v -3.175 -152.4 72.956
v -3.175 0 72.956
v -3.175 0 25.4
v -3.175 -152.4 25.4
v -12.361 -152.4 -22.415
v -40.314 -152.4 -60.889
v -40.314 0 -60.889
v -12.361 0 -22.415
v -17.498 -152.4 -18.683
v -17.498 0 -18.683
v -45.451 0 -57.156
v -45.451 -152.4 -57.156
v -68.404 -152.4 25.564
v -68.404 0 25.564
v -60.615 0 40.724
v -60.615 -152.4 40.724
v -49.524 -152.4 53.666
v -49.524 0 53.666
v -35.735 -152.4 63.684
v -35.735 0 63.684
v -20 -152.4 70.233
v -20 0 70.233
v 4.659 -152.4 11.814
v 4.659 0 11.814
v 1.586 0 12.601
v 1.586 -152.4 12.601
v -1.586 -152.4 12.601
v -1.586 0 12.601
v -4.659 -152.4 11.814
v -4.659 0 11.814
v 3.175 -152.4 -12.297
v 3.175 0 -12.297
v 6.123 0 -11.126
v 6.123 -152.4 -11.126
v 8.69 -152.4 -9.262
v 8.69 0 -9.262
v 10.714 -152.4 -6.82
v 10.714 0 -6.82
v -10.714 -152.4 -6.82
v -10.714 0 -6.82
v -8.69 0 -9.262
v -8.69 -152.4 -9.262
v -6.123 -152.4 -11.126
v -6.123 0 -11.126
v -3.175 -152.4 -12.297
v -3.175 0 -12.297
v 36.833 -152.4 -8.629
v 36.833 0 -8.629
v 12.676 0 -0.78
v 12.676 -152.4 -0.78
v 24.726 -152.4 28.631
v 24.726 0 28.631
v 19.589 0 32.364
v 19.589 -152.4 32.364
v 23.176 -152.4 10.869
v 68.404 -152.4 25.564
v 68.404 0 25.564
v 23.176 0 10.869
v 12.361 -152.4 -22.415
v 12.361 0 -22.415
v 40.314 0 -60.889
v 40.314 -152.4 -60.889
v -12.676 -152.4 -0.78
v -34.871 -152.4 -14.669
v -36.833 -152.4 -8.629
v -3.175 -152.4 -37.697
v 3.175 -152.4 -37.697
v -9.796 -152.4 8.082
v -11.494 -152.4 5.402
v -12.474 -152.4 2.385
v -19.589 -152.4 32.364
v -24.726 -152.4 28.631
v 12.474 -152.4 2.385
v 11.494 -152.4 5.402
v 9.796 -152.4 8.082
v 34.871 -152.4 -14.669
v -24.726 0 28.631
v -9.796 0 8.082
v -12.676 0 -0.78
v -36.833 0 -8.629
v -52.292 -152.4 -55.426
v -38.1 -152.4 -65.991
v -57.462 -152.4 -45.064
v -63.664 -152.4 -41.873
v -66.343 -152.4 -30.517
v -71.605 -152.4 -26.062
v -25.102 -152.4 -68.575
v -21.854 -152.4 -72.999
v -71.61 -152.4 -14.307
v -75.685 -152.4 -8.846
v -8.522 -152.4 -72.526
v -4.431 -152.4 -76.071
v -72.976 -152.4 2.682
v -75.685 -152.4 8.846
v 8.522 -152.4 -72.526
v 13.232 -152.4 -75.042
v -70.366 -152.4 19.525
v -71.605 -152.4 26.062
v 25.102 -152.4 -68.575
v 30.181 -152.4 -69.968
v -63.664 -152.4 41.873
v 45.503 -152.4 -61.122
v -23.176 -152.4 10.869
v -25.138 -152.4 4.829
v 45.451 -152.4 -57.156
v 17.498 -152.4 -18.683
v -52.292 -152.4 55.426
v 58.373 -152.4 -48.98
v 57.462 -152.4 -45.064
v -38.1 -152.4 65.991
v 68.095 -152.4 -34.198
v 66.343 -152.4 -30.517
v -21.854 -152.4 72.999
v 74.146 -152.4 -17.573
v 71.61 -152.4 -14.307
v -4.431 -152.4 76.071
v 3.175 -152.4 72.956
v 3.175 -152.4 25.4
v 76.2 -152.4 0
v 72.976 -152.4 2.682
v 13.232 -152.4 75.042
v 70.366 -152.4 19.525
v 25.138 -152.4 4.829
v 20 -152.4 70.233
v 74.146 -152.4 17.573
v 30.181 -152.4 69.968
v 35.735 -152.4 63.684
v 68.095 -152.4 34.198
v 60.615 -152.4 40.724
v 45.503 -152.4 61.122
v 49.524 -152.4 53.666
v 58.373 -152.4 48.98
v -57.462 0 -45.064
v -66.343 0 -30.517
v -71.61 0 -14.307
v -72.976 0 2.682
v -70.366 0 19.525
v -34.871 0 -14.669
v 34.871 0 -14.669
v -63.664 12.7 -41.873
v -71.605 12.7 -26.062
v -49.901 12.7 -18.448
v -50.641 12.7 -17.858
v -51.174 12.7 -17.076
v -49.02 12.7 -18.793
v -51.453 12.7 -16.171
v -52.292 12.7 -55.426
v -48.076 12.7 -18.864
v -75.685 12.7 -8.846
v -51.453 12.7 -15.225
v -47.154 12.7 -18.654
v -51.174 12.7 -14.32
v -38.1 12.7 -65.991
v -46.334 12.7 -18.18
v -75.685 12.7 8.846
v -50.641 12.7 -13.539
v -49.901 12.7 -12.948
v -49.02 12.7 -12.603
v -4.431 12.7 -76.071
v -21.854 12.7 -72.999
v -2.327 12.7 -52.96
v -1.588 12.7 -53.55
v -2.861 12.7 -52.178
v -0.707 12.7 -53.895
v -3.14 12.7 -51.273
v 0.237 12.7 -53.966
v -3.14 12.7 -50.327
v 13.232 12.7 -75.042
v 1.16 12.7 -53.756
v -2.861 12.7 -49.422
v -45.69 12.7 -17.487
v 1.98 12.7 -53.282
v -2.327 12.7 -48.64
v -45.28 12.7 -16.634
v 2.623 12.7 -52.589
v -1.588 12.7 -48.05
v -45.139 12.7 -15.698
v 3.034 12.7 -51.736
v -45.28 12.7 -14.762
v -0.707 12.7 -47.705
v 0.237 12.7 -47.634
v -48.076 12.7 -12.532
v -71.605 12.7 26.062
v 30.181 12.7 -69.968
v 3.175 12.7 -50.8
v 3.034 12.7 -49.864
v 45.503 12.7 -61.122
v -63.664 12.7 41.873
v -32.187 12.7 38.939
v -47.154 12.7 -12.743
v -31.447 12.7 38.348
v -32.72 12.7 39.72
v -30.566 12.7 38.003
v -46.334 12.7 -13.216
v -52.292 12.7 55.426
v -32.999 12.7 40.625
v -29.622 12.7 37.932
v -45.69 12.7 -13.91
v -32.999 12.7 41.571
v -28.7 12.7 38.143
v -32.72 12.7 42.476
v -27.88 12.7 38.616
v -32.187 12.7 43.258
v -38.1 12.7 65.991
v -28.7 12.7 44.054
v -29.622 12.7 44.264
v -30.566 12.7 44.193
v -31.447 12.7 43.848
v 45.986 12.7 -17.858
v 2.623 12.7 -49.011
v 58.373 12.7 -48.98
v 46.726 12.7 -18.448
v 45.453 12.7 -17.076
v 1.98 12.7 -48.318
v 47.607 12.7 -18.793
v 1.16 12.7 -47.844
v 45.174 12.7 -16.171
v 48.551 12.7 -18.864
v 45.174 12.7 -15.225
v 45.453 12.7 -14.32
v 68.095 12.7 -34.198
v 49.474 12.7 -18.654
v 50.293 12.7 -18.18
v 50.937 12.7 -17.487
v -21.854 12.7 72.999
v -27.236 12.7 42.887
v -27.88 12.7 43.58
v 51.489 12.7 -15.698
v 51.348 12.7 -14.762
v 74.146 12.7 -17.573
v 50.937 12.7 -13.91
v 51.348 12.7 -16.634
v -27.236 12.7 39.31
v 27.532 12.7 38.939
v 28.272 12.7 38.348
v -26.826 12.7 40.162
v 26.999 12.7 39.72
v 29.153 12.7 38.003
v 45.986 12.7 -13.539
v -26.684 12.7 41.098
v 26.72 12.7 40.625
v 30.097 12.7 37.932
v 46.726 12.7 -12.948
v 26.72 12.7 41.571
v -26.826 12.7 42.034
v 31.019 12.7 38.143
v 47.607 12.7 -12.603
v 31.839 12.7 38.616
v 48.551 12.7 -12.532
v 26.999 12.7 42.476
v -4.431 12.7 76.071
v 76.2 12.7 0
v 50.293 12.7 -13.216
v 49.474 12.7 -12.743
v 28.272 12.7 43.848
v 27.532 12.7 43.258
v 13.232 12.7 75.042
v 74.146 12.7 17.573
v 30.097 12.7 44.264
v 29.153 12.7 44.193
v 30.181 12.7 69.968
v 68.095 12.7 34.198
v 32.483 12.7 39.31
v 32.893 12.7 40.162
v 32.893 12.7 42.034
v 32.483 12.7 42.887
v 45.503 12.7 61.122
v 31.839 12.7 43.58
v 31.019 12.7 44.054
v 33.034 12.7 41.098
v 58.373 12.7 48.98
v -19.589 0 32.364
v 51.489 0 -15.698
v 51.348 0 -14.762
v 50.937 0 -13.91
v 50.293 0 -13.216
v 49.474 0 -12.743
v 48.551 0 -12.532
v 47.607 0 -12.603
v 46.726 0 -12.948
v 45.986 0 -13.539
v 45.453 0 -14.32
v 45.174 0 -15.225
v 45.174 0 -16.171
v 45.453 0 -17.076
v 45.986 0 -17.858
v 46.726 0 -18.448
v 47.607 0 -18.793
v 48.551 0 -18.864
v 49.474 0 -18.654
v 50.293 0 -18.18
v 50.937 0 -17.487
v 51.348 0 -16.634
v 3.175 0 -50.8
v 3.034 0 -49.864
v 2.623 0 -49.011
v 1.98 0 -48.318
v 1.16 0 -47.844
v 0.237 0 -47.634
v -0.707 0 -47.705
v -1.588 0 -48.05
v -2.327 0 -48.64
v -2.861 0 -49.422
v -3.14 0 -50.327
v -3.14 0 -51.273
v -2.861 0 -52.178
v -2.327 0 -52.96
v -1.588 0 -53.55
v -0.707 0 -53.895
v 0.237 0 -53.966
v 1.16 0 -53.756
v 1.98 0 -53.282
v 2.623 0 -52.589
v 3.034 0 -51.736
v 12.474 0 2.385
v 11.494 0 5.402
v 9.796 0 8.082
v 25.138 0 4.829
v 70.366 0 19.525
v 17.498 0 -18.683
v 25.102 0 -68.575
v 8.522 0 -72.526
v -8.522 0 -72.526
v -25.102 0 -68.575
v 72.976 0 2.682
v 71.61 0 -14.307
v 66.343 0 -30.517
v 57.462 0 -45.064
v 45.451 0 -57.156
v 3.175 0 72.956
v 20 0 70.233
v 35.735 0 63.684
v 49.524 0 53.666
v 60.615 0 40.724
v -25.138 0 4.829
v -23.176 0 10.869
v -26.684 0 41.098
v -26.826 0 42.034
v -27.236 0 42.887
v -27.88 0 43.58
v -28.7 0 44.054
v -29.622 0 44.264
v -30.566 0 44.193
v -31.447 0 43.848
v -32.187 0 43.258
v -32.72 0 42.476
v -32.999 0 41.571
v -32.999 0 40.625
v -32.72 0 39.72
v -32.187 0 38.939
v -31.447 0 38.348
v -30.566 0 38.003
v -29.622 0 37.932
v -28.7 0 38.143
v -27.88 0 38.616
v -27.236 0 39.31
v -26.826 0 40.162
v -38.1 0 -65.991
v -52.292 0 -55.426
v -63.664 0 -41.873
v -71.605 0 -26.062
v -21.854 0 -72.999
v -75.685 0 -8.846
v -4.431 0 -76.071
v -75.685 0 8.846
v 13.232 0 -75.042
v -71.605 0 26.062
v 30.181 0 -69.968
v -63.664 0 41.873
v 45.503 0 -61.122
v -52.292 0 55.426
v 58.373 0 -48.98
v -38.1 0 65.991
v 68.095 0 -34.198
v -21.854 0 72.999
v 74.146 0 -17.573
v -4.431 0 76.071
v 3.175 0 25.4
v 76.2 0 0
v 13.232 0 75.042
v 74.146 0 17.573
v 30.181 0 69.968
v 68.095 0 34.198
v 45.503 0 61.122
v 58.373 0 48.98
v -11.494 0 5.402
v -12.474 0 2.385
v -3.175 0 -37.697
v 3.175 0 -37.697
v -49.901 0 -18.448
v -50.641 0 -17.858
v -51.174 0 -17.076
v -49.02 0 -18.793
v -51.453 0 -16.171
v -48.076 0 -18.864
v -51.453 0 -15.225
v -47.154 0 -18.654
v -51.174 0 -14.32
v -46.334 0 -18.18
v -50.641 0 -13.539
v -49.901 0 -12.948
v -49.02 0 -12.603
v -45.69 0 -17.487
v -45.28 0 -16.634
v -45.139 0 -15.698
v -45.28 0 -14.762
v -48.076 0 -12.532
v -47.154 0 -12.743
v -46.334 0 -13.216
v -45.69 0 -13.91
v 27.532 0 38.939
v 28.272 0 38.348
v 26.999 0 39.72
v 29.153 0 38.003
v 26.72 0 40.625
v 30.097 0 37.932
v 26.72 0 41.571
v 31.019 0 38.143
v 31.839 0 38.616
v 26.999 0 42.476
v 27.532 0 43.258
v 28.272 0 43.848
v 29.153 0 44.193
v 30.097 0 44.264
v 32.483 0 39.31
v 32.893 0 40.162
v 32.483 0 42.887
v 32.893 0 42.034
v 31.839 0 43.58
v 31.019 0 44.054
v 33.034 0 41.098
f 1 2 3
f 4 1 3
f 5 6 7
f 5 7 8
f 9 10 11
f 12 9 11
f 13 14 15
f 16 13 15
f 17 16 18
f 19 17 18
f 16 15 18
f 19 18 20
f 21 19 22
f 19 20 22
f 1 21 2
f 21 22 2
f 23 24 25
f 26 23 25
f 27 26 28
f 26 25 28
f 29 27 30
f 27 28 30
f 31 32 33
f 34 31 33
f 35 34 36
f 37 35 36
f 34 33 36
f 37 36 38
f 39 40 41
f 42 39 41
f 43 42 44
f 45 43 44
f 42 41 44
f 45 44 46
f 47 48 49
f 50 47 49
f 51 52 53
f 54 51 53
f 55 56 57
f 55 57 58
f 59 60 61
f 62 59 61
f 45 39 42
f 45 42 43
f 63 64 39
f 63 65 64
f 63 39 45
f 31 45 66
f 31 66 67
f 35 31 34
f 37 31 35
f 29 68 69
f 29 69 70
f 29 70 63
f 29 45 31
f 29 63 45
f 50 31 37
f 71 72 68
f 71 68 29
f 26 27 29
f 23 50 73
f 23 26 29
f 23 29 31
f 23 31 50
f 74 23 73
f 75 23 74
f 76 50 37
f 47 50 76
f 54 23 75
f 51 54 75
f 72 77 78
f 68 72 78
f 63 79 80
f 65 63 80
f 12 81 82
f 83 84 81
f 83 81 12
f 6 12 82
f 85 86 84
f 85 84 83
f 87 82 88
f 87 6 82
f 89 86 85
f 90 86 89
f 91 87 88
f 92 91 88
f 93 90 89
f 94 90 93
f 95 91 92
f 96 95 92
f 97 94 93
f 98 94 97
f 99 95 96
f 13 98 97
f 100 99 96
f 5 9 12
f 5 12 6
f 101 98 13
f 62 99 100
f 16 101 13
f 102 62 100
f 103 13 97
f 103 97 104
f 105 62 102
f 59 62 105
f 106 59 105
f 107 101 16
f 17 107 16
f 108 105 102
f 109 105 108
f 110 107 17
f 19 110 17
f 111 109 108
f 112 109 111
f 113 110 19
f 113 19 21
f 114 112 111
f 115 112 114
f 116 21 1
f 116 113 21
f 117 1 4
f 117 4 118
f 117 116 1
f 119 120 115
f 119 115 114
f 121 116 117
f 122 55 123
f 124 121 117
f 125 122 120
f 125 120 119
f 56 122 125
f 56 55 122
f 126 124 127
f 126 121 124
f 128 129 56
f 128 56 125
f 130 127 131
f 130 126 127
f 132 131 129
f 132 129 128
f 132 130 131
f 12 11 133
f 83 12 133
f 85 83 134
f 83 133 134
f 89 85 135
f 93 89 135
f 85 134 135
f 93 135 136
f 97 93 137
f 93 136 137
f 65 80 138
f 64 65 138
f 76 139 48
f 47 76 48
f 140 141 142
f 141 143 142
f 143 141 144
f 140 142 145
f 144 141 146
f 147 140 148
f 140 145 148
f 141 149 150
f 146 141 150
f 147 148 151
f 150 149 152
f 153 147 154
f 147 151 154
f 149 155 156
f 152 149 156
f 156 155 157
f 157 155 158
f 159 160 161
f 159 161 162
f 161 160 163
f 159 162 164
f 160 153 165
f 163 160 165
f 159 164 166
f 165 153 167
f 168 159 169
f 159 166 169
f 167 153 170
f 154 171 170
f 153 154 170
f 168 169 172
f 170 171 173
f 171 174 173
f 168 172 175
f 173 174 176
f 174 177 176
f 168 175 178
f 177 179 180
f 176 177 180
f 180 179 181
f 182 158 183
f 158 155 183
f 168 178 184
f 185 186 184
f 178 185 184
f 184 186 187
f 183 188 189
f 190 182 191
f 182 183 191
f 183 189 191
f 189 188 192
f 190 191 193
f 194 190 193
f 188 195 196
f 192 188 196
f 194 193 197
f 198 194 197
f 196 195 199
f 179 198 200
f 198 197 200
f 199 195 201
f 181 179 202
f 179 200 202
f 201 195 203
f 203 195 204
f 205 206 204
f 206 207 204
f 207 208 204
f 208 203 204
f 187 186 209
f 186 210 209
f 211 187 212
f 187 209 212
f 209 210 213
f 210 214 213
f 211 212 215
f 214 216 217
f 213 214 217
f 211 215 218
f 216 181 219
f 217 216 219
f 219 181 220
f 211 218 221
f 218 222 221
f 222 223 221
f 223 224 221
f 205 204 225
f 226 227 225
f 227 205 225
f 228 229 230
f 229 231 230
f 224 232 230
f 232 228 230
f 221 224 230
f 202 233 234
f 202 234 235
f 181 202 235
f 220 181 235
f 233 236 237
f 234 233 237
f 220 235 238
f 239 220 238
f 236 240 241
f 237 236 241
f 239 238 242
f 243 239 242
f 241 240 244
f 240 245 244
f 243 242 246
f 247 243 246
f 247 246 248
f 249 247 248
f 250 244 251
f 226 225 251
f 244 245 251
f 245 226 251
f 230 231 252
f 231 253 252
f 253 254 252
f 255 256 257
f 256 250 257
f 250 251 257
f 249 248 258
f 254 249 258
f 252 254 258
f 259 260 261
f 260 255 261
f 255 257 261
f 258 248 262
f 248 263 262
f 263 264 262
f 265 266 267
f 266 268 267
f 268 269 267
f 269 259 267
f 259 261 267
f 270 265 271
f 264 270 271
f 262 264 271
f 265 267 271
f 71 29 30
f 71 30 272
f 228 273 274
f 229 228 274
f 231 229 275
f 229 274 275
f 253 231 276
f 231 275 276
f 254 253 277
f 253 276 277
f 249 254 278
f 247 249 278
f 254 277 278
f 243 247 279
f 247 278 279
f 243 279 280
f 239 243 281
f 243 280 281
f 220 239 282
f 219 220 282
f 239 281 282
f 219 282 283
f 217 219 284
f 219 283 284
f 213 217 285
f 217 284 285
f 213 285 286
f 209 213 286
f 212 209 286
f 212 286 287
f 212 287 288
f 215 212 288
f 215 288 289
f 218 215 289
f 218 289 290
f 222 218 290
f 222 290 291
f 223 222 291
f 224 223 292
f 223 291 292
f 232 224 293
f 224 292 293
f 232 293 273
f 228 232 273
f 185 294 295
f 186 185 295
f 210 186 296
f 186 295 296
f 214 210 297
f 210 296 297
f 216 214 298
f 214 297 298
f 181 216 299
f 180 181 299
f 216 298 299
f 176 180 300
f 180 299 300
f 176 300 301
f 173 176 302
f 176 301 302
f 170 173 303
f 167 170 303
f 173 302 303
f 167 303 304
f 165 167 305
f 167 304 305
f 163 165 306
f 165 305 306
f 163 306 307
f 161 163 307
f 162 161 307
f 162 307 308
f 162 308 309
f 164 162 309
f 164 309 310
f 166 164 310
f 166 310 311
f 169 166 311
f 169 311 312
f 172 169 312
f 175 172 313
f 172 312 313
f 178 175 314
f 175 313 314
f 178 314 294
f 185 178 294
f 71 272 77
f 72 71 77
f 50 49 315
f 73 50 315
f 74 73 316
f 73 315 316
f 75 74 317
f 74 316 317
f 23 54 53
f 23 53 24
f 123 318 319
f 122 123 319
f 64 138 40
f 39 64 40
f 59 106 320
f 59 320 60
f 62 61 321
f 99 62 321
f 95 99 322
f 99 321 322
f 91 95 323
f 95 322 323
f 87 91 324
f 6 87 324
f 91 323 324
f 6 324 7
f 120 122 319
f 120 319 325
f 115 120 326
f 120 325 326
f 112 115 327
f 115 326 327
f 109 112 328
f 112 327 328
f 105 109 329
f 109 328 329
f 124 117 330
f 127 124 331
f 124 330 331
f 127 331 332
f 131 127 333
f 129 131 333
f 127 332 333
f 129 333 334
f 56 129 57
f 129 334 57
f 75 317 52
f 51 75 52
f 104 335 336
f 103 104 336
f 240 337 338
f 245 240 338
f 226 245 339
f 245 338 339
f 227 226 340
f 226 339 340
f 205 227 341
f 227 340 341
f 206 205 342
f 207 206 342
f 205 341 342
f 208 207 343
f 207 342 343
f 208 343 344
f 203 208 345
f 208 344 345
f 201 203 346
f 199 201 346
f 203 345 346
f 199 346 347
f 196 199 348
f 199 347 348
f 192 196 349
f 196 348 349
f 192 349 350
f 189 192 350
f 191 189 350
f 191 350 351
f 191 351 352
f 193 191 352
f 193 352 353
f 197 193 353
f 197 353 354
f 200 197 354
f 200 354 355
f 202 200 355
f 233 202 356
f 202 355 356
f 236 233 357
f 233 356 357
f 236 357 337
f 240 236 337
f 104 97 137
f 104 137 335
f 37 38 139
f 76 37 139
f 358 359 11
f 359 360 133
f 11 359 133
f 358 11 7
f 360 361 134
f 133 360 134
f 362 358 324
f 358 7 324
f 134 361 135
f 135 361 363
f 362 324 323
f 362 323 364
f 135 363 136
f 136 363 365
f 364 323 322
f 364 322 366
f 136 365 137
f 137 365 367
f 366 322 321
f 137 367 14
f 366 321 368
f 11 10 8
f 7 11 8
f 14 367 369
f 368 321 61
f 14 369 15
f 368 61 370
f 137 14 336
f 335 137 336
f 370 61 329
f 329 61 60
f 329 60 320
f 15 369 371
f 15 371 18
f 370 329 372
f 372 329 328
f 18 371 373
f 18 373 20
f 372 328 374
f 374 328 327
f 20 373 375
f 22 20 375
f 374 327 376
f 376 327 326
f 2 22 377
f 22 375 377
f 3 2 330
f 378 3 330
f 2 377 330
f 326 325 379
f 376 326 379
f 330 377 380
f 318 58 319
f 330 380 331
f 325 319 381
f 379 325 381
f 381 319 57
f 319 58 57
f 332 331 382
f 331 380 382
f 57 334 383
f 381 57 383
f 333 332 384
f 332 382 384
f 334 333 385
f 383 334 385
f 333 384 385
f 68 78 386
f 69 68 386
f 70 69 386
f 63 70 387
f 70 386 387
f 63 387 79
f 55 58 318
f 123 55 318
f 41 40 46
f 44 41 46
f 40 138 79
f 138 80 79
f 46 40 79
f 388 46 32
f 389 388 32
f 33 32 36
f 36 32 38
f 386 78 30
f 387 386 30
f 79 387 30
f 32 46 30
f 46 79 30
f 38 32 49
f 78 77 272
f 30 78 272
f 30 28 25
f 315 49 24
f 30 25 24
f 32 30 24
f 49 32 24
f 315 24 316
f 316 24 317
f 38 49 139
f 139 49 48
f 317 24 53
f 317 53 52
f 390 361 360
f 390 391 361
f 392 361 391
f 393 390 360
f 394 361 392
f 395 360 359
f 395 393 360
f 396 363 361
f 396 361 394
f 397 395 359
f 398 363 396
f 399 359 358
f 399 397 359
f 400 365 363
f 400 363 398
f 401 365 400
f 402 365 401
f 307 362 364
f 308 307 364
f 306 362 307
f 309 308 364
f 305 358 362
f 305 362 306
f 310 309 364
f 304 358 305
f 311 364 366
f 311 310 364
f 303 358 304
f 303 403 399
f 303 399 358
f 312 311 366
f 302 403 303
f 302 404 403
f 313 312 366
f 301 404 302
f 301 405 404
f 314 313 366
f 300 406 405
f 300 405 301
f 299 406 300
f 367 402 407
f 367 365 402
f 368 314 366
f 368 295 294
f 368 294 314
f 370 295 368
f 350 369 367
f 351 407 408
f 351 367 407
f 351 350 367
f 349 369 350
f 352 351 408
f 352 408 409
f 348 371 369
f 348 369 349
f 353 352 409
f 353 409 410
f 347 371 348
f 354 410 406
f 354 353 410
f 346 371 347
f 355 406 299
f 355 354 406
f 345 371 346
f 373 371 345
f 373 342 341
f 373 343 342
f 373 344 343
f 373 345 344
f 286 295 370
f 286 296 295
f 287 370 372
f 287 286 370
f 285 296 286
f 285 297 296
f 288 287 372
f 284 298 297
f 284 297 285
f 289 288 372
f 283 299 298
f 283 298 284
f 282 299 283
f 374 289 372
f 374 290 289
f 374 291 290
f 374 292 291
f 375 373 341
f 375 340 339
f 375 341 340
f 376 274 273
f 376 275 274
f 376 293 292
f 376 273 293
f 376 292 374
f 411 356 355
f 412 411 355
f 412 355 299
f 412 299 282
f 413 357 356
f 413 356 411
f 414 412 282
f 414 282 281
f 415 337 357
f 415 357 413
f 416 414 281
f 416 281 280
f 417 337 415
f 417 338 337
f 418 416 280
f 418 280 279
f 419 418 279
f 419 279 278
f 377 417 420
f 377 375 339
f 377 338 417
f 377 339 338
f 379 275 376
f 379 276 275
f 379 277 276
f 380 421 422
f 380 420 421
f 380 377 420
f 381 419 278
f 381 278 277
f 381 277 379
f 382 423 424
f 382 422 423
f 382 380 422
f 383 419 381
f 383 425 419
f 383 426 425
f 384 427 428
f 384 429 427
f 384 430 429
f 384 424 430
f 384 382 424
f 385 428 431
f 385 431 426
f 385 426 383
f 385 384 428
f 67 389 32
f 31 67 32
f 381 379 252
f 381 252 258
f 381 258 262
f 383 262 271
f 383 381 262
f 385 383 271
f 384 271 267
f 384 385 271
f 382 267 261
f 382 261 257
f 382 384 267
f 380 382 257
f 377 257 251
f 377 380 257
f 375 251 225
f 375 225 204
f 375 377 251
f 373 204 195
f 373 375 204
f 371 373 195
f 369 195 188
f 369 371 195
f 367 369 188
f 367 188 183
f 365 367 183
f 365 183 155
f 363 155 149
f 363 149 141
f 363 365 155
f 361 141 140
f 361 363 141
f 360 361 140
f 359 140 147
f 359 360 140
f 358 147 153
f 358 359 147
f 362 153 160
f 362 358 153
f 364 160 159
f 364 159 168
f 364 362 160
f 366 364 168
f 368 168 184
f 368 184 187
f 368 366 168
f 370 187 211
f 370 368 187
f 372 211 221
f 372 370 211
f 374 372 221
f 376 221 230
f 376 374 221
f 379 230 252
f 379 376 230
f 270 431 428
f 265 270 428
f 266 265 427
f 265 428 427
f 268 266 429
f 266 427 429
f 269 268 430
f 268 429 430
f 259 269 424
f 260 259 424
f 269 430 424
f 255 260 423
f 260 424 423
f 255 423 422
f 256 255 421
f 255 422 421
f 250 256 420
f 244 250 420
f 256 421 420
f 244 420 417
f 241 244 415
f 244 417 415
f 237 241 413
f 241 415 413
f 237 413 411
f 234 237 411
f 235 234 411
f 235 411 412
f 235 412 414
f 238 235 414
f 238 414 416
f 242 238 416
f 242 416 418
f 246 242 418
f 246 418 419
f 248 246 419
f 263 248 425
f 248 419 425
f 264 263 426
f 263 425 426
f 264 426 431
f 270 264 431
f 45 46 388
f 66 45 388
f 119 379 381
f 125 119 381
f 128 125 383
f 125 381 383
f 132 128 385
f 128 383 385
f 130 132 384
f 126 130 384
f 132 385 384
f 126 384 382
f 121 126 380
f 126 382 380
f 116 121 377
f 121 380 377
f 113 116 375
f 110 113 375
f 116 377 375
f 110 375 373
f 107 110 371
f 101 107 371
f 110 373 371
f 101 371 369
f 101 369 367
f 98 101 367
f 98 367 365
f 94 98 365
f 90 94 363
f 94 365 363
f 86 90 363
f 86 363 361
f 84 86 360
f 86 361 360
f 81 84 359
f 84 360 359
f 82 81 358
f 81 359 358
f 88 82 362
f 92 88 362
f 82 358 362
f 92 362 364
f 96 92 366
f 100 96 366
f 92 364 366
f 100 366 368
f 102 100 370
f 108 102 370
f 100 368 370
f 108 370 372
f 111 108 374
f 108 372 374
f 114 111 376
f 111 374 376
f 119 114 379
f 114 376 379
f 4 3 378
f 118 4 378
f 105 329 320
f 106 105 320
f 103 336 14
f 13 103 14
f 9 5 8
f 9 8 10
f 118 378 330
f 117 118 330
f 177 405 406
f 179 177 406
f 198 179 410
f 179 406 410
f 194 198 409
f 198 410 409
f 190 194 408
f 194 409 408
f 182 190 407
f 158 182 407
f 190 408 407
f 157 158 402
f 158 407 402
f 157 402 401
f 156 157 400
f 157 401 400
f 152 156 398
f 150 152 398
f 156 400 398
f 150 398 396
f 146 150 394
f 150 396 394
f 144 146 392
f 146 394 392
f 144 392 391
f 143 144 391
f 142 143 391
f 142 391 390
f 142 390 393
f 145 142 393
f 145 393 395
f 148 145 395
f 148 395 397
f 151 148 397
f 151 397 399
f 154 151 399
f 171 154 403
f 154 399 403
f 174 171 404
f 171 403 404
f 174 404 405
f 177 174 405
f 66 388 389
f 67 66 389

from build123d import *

# Parameters (mm, degrees)
F0_R     = 76.2
F1_DEPTH = 152.4
F2_DEPTH = 152.4
F3_R     = 76.2
F3_R_2   = 3.175
F4_DEPTH = 12.7


with BuildPart() as f1:
    # F0 (on Front) → F1 (new body)
    with BuildSketch(Plane.XZ):
        Circle(F0_R)
        with BuildLine():
            ThreePointArc((40.3138, -60.888818), (0, -73.025), (-40.3138, -60.888818))
            Line((-40.3138, -60.888818), (-12.361116, -22.41525))
            Line((-12.361116, -22.41525), (-17.498374, -18.682813))
            Line((-17.498374, -18.682813), (-45.451058, -57.156382))
            ThreePointArc((-45.451058, -57.156382), (-69.450902, -22.565966), (-70.366356, 19.525023))
            Line((-70.366356, 19.525023), (-25.137964, 4.829427))
            Line((-25.137964, 4.829427), (-23.175707, 10.868636))
            Line((-23.175707, 10.868636), (-68.404099, 25.564231))
            ThreePointArc((-68.404099, 25.564231), (-42.923018, 59.078466), (-3.175, 72.955946))
            Line((-3.175, 72.955946), (-3.175, 25.4))
            Line((-3.175, 25.4), (3.175, 25.4))
            Line((3.175, 25.4), (3.175, 72.955946))
            ThreePointArc((3.175, 72.955946), (42.923018, 59.078466), (68.404099, 25.564231))
            Line((68.404099, 25.564231), (23.175707, 10.868636))
            Line((23.175707, 10.868636), (25.137964, 4.829427))
            Line((25.137964, 4.829427), (70.366356, 19.525023))
            ThreePointArc((70.366356, 19.525023), (69.450902, -22.565966), (45.451058, -57.156382))
            Line((45.451058, -57.156382), (17.498374, -18.682813))
            Line((17.498374, -18.682813), (12.361116, -22.41525))
            Line((12.361116, -22.41525), (40.3138, -60.888818))
        make_face(mode=Mode.SUBTRACT)
    extrude(amount=F1_DEPTH)


with BuildPart() as f2:
    # F0 (on Front) → F2 (new body)
    with BuildSketch(Plane.XZ):
        with BuildLine():
            Line((-34.870584, -14.668532), (-10.713749, -6.819501))
            ThreePointArc((-10.713749, -6.819501), (-7.464873, -10.274516), (-3.175, -12.296722))
            Line((-3.175, -12.296722), (-3.175, -37.696722))
            Line((-3.175, -37.696722), (3.175, -37.696722))
            Line((3.175, -37.696722), (3.175, -12.296722))
            ThreePointArc((3.175, -12.296722), (7.464873, -10.274516), (10.713749, -6.819501))
            Line((10.713749, -6.819501), (34.870584, -14.668532))
            Line((34.870584, -14.668532), (36.832842, -8.629323))
            Line((36.832842, -8.629323), (12.676007, -0.780292))
            ThreePointArc((12.676007, -0.780292), (12.078418, 3.924516), (9.796461, 8.082039))
            Line((9.796461, 8.082039), (24.726206, 28.631071))
            Line((24.726206, 28.631071), (19.588948, 32.363507))
            Line((19.588948, 32.363507), (4.659203, 11.814475))
            ThreePointArc((4.659203, 11.814475), (0, 12.7), (-4.659203, 11.814475))
            Line((-4.659203, 11.814475), (-19.588948, 32.363507))
            Line((-19.588948, 32.363507), (-24.726206, 28.631071))
            Line((-24.726206, 28.631071), (-9.796461, 8.082039))
            ThreePointArc((-9.796461, 8.082039), (-12.078418, 3.924516), (-12.676007, -0.780292))
            Line((-12.676007, -0.780292), (-36.832842, -8.629323))
            Line((-36.832842, -8.629323), (-34.870584, -14.668532))
        make_face()
    extrude(amount=F2_DEPTH)


with BuildPart() as f4:
    # F3 (on face) → F4 (new body)
    with BuildSketch(Plane.XZ):
        Circle(F3_R)
        with Locations((-48.313671, -15.698063)):
            Circle(F3_R_2, mode=Mode.SUBTRACT)
        with Locations((0, -50.8)):
            Circle(F3_R_2, mode=Mode.SUBTRACT)
        with Locations((48.313671, -15.698063)):
            Circle(F3_R_2, mode=Mode.SUBTRACT)
        with Locations((-29.859491, 41.098063)):
            Circle(F3_R_2, mode=Mode.SUBTRACT)
        with Locations((29.859491, 41.098063)):
            Circle(F3_R_2, mode=Mode.SUBTRACT)
    extrude(amount=-F4_DEPTH)


solid = Compound([f1.part, f2.part, f4.part])
